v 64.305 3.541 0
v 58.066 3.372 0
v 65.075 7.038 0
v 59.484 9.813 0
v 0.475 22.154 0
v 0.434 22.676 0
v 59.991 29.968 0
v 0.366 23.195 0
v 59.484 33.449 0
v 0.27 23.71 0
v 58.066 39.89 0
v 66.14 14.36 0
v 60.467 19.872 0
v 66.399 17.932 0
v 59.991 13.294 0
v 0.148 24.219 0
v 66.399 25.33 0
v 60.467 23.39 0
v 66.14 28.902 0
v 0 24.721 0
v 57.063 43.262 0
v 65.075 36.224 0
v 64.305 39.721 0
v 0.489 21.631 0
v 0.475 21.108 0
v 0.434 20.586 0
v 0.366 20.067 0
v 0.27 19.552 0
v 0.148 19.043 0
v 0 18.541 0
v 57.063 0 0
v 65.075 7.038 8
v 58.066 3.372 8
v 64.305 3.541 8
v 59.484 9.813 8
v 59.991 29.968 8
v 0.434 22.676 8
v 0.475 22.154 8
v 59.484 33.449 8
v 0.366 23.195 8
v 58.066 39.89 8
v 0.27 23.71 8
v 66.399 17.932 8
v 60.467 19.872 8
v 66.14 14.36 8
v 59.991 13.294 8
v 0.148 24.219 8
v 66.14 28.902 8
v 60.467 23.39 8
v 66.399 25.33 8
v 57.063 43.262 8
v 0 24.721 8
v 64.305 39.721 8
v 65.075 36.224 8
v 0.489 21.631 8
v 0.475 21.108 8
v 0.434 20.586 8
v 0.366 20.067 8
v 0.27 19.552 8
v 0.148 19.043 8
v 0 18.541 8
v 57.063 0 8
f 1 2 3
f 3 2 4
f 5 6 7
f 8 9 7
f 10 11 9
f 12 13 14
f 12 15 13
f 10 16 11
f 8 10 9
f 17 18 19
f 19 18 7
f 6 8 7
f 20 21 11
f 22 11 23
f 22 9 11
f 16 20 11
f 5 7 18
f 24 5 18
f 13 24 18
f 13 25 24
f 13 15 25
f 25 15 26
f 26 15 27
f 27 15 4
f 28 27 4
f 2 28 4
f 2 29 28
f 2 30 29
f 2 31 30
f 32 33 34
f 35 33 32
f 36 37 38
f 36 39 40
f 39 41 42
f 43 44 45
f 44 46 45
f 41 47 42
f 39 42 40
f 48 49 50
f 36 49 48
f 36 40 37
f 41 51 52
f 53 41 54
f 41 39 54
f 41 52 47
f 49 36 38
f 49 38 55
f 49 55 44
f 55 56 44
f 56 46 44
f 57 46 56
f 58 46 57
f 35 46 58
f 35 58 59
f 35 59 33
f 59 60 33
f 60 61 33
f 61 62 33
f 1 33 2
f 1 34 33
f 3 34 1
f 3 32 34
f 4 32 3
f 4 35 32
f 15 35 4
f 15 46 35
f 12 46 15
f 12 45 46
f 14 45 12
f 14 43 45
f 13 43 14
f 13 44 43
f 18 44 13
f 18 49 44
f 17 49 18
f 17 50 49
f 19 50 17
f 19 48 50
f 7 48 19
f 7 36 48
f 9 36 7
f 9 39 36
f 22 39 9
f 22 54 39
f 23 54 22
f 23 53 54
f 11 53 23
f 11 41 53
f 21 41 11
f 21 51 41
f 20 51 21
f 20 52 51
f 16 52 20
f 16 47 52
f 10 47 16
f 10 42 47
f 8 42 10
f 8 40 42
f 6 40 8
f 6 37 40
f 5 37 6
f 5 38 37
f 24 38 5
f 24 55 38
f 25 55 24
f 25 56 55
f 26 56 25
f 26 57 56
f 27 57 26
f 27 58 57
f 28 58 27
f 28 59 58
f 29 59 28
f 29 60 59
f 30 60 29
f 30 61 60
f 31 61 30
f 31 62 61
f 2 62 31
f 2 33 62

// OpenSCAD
$fn = 32;

// ----------------------------------------------------------------------
// Gear sector: 4 teeth on 36 degrees
// ----------------------------------------------------------------------

// --- parameters (mm) ---
sector_angle = 36;        // sector angle, degrees
root_r = 70;              // root circle radius
tooth_h = 6;              // tooth height over the root circle
teeth = 4;                // number of teeth on the sector
hub_r = 10;               // hub bore radius
plate_t = 8;              // sector thickness, Z
arc_step = 3;             // sampling step of the root/hub arcs, degrees

tip_r = root_r + tooth_h;  // tip circle radius

profile = [[57.063, 0], [58.066, 3.372], [64.305, 3.541], [65.075, 7.038], [59.484, 9.813], [59.991, 13.294], [66.14, 14.36], [66.399, 17.932], [60.467, 19.872], [60.467, 23.39], [66.399, 25.33], [66.14, 28.902], [59.991, 29.968], [59.484, 33.449], [65.075, 36.224], [64.305, 39.721], [58.066, 39.89], [57.063, 43.262], [0, 24.721], [0.148, 24.219], [0.27, 23.71], [0.366, 23.195], [0.434, 22.676], [0.475, 22.154], [0.489, 21.631], [0.475, 21.108], [0.434, 20.586], [0.366, 20.067], [0.27, 19.552], [0.148, 19.043], [0, 18.541]];  // primary outline, 31 points, counter clockwise

// --- the one profile operation ---
linear_extrude(height = plate_t) polygon(points = profile);
